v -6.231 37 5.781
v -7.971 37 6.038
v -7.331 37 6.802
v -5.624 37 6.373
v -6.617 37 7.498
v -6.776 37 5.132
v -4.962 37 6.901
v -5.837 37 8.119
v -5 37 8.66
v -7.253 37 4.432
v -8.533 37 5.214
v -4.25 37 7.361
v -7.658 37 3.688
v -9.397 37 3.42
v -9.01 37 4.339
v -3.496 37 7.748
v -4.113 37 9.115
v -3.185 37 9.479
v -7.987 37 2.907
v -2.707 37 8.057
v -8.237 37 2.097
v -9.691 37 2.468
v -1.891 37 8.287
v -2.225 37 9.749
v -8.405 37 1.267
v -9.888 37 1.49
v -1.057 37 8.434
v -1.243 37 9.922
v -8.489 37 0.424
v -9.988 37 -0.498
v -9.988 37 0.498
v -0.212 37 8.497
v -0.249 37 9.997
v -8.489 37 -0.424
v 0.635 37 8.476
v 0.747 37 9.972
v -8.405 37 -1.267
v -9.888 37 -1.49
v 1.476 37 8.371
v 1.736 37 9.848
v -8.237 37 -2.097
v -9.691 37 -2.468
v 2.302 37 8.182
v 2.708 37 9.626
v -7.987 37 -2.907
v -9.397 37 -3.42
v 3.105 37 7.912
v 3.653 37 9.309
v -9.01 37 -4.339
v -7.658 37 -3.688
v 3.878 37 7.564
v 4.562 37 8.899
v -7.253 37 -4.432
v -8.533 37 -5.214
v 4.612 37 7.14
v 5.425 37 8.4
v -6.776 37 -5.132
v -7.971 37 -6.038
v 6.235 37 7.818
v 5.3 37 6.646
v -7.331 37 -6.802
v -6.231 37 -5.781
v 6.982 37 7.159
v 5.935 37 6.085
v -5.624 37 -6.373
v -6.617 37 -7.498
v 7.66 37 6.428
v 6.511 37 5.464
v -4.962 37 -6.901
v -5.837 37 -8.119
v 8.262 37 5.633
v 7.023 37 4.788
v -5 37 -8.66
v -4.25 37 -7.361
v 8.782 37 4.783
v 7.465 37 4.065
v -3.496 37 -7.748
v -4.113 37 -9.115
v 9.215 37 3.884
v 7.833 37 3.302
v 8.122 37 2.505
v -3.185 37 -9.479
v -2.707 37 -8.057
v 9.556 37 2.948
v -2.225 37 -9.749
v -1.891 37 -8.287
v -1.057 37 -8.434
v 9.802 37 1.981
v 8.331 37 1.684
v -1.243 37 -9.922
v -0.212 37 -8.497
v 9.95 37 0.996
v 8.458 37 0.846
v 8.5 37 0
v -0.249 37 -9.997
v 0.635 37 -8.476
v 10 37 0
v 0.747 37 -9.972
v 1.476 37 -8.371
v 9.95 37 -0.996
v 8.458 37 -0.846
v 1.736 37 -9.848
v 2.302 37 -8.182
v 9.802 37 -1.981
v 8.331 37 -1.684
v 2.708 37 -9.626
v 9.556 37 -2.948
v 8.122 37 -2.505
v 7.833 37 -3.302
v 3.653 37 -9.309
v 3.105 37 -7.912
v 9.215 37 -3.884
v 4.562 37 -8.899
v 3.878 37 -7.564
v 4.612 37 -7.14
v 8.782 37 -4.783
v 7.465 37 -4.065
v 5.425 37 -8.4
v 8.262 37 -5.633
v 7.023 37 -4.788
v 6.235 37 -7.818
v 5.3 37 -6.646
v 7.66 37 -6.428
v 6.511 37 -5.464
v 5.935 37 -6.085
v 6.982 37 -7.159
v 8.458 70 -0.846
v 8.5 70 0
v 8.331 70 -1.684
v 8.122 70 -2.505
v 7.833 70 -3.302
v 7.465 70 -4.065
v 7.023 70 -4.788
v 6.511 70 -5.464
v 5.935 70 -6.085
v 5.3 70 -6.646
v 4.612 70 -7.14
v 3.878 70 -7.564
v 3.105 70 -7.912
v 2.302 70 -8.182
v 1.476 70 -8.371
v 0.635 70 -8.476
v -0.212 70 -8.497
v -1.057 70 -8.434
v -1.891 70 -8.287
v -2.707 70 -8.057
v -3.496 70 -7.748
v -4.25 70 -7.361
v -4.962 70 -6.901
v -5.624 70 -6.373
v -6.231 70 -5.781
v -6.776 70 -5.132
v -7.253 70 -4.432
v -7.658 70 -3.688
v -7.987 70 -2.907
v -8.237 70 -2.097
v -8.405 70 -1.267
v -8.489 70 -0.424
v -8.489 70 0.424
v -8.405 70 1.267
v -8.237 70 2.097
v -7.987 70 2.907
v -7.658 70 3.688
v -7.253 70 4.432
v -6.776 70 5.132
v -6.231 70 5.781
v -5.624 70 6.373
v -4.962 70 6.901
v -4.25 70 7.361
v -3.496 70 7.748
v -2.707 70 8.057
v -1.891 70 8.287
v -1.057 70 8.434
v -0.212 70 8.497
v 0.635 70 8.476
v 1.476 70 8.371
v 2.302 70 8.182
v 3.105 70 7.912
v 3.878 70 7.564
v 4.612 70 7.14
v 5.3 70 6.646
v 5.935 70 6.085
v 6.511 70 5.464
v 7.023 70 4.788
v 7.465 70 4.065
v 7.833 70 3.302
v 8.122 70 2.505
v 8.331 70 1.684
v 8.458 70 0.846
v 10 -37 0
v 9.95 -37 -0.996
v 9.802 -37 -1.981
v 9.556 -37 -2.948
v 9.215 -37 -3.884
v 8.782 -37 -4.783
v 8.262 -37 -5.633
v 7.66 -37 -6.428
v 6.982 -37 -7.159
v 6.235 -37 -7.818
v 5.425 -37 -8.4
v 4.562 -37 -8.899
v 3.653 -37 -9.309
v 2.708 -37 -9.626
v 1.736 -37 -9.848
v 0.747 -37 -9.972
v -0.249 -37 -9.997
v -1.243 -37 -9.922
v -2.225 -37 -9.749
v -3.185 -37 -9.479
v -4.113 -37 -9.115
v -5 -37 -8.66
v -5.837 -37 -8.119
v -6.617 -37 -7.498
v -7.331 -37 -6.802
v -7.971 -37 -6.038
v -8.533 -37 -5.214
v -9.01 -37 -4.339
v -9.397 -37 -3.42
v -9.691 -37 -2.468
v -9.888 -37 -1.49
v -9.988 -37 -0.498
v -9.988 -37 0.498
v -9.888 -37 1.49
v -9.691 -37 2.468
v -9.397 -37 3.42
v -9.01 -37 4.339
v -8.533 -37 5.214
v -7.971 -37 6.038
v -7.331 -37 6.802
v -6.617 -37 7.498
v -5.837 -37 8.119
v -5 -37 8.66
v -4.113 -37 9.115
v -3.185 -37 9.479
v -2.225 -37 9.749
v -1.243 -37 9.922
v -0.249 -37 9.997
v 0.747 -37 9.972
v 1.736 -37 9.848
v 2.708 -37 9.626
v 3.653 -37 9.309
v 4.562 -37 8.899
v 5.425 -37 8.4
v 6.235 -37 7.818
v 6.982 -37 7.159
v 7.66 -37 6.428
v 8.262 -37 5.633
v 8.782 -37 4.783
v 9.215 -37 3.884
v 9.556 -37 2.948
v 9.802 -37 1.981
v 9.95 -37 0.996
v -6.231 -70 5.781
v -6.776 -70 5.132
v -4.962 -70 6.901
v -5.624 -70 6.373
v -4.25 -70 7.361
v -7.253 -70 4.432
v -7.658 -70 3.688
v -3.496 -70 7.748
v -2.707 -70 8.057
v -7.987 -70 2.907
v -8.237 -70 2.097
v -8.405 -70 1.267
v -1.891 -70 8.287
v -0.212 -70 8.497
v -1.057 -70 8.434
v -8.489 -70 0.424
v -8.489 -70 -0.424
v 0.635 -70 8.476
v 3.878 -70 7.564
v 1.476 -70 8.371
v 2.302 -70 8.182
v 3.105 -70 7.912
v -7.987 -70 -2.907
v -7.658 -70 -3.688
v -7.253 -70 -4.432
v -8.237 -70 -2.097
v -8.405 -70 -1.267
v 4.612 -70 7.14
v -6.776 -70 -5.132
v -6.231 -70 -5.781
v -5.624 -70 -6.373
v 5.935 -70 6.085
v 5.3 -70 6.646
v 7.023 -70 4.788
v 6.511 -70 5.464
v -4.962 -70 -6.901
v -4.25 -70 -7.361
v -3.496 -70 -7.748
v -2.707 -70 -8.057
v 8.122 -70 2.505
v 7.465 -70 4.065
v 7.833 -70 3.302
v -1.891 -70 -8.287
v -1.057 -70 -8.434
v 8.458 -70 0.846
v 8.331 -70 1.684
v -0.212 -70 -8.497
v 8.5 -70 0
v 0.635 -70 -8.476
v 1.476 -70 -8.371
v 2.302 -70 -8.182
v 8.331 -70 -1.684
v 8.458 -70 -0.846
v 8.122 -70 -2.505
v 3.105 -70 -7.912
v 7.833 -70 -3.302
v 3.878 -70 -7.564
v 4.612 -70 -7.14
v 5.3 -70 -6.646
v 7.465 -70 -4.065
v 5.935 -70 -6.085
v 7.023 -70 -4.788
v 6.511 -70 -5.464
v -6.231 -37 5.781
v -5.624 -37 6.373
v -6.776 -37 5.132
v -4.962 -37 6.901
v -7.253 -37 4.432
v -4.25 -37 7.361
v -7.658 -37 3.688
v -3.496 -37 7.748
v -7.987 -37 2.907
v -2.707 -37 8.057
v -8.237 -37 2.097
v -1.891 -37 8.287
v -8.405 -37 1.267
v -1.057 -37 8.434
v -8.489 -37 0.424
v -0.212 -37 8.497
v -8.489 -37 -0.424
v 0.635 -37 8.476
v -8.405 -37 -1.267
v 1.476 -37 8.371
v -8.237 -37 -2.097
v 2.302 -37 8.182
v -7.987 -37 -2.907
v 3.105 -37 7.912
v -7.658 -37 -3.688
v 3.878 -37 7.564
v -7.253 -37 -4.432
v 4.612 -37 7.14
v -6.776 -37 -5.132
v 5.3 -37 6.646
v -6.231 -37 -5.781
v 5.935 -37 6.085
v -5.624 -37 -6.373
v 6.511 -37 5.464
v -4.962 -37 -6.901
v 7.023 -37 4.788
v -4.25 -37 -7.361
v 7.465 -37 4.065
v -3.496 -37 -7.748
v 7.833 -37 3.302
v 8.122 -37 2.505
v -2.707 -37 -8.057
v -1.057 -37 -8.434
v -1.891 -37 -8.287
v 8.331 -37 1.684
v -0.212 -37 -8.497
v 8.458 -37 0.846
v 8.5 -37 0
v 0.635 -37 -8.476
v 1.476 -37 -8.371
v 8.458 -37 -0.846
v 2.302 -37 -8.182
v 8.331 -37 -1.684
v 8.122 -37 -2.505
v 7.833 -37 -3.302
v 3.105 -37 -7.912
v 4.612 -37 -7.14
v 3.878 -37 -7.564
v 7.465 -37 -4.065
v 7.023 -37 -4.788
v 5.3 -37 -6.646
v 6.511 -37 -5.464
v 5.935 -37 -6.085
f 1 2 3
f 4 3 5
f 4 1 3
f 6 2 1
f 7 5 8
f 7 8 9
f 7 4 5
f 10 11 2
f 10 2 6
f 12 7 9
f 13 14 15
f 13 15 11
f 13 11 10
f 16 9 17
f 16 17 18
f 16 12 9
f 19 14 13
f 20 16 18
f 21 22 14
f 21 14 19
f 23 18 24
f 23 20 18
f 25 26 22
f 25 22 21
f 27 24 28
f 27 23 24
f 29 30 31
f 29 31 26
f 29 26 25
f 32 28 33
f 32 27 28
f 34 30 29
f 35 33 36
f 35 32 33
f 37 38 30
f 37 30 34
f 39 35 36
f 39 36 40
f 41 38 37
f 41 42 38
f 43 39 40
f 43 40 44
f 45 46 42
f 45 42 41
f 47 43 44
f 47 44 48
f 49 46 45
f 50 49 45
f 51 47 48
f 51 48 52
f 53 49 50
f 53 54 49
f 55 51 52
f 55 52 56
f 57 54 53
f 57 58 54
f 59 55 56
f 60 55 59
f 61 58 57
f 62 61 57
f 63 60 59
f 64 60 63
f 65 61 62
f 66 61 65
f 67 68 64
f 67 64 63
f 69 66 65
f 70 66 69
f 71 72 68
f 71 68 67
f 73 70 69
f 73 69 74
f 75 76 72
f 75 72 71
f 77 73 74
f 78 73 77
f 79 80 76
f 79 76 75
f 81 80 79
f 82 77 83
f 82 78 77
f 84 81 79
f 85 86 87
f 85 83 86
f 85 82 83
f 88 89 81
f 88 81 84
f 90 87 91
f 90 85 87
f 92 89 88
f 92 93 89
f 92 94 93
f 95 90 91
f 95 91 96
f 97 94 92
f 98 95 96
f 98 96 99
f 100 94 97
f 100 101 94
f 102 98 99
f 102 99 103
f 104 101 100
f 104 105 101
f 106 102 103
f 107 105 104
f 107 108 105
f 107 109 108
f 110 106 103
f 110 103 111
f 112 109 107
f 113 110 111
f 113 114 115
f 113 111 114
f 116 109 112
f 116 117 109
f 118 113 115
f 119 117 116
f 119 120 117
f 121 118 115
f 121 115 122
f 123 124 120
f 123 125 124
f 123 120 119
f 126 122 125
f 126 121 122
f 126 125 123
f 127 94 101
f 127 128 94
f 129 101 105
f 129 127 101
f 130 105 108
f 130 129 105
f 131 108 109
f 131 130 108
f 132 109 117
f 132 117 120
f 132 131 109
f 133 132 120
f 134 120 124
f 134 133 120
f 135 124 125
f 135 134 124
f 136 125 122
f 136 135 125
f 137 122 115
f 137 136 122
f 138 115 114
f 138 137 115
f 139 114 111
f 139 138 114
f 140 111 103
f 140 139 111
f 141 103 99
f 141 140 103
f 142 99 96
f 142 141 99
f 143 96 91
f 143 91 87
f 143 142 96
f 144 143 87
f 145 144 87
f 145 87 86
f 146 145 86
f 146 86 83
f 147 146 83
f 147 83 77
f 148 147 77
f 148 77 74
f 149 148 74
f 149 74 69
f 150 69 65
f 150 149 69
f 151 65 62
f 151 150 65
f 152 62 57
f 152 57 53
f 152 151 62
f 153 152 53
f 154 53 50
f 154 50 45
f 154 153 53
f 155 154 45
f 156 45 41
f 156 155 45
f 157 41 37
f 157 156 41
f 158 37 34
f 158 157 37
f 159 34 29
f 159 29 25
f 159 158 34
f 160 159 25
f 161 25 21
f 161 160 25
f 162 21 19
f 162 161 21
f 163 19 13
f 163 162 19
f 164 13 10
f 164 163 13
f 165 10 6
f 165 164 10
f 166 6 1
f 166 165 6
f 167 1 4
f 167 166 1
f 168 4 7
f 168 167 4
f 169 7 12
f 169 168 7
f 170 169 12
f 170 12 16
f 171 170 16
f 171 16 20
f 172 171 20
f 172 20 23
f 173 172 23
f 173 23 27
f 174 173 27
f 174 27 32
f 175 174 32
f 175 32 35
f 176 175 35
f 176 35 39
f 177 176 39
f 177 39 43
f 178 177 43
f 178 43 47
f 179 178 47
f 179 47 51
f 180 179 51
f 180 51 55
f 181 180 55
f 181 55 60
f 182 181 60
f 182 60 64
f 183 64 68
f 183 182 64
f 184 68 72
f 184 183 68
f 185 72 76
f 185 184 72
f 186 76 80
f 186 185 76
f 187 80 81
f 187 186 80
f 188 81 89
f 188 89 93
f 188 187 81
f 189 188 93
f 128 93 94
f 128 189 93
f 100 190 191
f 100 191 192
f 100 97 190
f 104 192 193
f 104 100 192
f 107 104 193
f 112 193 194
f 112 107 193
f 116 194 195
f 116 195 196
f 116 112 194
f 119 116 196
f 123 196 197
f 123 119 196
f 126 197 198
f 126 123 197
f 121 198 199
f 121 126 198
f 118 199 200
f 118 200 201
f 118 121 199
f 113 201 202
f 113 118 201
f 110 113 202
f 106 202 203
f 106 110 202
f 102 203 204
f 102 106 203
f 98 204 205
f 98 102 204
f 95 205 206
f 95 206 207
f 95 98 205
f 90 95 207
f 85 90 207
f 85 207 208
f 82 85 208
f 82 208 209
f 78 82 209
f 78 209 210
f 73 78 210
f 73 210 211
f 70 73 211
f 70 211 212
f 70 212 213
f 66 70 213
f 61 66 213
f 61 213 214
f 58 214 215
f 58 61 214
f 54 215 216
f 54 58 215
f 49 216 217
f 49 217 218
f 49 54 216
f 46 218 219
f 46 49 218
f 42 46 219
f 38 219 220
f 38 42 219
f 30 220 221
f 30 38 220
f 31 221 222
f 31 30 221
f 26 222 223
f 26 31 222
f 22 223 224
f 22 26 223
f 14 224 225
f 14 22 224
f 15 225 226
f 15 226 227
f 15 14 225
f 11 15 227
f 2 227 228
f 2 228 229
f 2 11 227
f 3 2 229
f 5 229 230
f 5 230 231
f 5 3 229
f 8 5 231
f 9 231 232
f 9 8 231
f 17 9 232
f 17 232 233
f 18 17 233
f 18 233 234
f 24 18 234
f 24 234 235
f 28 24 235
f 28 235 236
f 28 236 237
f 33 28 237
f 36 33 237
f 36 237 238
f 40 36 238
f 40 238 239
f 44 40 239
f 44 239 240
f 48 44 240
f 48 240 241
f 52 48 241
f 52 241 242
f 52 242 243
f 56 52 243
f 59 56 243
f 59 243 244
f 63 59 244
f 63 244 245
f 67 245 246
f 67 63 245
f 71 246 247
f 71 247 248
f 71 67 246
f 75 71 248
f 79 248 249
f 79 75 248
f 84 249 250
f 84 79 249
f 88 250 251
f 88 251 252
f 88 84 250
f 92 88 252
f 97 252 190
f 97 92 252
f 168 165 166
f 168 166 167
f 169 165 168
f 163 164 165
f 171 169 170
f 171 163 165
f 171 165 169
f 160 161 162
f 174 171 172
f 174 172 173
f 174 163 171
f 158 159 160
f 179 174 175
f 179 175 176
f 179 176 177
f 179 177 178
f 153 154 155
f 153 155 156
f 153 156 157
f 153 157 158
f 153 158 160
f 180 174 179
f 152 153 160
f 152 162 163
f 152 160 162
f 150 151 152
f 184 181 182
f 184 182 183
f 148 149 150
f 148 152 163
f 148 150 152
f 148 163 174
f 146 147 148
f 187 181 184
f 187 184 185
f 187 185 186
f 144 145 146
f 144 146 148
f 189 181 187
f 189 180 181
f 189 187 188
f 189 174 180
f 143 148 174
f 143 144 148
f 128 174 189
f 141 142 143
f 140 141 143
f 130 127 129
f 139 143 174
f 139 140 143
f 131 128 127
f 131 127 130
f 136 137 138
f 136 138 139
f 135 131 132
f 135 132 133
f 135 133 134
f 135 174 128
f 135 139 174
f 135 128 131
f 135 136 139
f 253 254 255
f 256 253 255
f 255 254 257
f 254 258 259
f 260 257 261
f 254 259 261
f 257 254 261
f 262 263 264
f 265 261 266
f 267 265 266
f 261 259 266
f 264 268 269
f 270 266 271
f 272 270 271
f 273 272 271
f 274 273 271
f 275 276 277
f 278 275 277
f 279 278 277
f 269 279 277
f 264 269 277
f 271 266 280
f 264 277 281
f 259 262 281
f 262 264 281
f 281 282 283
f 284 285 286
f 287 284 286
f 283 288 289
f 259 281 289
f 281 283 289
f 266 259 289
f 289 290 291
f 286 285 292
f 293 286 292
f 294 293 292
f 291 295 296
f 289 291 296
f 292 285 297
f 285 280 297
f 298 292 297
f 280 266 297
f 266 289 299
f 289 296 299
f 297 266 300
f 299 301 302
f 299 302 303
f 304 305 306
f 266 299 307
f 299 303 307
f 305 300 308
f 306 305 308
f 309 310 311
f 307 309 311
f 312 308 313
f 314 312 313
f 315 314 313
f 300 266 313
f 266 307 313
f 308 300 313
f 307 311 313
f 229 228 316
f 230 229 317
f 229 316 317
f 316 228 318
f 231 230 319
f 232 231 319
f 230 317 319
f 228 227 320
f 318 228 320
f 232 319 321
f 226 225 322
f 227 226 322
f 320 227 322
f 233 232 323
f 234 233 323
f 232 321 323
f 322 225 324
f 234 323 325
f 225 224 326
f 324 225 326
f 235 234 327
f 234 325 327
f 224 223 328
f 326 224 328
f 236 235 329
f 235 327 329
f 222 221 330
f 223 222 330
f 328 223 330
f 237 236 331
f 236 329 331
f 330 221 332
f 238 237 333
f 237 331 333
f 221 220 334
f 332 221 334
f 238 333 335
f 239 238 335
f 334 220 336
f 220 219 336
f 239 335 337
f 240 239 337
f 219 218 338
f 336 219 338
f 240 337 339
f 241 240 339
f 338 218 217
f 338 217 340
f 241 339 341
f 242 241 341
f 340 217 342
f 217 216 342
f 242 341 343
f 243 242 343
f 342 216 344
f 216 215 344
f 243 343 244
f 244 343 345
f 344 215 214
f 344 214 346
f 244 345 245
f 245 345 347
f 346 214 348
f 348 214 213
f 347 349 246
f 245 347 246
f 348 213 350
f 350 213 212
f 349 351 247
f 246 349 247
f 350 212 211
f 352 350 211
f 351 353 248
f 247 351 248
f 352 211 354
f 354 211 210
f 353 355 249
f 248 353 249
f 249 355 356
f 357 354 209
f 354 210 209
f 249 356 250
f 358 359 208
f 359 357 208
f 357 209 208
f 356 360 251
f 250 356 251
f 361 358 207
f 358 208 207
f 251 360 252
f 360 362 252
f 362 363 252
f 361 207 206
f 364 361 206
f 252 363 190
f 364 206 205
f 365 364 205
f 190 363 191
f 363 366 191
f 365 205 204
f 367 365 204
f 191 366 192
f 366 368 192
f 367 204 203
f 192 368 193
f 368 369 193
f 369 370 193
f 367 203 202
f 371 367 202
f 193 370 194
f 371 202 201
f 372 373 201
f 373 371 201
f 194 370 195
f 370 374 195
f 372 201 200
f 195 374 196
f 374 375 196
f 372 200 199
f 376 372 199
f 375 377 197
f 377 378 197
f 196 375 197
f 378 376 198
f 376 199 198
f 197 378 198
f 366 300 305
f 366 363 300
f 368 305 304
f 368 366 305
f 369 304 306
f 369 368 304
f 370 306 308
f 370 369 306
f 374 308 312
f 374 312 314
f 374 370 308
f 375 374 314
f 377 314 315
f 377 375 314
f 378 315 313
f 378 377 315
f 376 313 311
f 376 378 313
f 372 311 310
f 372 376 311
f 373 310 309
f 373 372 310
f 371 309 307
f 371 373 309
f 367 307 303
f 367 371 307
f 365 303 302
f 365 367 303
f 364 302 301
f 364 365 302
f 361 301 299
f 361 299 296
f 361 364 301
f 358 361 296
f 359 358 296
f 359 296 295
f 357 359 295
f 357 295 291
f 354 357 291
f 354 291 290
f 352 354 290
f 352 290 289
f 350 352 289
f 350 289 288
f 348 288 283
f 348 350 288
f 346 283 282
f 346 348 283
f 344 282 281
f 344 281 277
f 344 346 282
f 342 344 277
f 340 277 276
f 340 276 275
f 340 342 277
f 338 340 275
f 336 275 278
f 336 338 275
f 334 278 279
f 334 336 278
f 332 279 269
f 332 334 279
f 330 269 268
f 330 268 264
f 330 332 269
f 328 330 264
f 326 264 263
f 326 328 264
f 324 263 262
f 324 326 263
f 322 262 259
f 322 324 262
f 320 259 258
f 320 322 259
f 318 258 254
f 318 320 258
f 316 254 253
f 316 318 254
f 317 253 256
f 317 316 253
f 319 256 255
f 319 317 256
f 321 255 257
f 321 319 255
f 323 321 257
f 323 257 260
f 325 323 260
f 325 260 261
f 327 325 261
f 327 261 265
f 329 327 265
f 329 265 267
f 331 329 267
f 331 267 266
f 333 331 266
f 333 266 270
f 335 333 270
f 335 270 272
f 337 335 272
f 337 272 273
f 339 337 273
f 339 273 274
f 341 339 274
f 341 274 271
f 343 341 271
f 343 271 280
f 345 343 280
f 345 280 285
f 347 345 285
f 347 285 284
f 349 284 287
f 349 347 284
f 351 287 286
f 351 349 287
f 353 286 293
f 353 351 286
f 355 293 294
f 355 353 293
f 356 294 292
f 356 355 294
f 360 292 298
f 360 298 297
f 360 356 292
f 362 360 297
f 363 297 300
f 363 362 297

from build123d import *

# Parameters (mm, degrees)
BOSS_EXTRUDE1_DEPTH      = 70
BOSS_EXTRUDE1_DEPTH_BACK = 70
SKETCH1_R                = 8.5
BOSS_EXTRUDE2_DEPTH      = 37
BOSS_EXTRUDE2_DEPTH_BACK = 37
SKETCH2_R                = 10


with BuildPart() as part:
    # Sketch1 → Boss-Extrude1 (new, two sides: drawn at the far end of the back side and taken through both)
    with BuildSketch(Plane(origin=(0, 0, 0), x_dir=(1, 0, 0), z_dir=(0, 1, 0)).offset(-BOSS_EXTRUDE1_DEPTH_BACK)):
        Circle(SKETCH1_R)
    extrude(amount=BOSS_EXTRUDE1_DEPTH + BOSS_EXTRUDE1_DEPTH_BACK)

    # Sketch2 → Boss-Extrude2 (add, two sides: drawn at the far end of the back side and taken through both)
    with BuildSketch(Plane(origin=(0, 0, 0), x_dir=(1, 0, 0), z_dir=(0, 1, 0)).offset(-BOSS_EXTRUDE2_DEPTH_BACK)):
        Circle(SKETCH2_R)
    extrude(amount=BOSS_EXTRUDE2_DEPTH + BOSS_EXTRUDE2_DEPTH_BACK)


solid = part.part
